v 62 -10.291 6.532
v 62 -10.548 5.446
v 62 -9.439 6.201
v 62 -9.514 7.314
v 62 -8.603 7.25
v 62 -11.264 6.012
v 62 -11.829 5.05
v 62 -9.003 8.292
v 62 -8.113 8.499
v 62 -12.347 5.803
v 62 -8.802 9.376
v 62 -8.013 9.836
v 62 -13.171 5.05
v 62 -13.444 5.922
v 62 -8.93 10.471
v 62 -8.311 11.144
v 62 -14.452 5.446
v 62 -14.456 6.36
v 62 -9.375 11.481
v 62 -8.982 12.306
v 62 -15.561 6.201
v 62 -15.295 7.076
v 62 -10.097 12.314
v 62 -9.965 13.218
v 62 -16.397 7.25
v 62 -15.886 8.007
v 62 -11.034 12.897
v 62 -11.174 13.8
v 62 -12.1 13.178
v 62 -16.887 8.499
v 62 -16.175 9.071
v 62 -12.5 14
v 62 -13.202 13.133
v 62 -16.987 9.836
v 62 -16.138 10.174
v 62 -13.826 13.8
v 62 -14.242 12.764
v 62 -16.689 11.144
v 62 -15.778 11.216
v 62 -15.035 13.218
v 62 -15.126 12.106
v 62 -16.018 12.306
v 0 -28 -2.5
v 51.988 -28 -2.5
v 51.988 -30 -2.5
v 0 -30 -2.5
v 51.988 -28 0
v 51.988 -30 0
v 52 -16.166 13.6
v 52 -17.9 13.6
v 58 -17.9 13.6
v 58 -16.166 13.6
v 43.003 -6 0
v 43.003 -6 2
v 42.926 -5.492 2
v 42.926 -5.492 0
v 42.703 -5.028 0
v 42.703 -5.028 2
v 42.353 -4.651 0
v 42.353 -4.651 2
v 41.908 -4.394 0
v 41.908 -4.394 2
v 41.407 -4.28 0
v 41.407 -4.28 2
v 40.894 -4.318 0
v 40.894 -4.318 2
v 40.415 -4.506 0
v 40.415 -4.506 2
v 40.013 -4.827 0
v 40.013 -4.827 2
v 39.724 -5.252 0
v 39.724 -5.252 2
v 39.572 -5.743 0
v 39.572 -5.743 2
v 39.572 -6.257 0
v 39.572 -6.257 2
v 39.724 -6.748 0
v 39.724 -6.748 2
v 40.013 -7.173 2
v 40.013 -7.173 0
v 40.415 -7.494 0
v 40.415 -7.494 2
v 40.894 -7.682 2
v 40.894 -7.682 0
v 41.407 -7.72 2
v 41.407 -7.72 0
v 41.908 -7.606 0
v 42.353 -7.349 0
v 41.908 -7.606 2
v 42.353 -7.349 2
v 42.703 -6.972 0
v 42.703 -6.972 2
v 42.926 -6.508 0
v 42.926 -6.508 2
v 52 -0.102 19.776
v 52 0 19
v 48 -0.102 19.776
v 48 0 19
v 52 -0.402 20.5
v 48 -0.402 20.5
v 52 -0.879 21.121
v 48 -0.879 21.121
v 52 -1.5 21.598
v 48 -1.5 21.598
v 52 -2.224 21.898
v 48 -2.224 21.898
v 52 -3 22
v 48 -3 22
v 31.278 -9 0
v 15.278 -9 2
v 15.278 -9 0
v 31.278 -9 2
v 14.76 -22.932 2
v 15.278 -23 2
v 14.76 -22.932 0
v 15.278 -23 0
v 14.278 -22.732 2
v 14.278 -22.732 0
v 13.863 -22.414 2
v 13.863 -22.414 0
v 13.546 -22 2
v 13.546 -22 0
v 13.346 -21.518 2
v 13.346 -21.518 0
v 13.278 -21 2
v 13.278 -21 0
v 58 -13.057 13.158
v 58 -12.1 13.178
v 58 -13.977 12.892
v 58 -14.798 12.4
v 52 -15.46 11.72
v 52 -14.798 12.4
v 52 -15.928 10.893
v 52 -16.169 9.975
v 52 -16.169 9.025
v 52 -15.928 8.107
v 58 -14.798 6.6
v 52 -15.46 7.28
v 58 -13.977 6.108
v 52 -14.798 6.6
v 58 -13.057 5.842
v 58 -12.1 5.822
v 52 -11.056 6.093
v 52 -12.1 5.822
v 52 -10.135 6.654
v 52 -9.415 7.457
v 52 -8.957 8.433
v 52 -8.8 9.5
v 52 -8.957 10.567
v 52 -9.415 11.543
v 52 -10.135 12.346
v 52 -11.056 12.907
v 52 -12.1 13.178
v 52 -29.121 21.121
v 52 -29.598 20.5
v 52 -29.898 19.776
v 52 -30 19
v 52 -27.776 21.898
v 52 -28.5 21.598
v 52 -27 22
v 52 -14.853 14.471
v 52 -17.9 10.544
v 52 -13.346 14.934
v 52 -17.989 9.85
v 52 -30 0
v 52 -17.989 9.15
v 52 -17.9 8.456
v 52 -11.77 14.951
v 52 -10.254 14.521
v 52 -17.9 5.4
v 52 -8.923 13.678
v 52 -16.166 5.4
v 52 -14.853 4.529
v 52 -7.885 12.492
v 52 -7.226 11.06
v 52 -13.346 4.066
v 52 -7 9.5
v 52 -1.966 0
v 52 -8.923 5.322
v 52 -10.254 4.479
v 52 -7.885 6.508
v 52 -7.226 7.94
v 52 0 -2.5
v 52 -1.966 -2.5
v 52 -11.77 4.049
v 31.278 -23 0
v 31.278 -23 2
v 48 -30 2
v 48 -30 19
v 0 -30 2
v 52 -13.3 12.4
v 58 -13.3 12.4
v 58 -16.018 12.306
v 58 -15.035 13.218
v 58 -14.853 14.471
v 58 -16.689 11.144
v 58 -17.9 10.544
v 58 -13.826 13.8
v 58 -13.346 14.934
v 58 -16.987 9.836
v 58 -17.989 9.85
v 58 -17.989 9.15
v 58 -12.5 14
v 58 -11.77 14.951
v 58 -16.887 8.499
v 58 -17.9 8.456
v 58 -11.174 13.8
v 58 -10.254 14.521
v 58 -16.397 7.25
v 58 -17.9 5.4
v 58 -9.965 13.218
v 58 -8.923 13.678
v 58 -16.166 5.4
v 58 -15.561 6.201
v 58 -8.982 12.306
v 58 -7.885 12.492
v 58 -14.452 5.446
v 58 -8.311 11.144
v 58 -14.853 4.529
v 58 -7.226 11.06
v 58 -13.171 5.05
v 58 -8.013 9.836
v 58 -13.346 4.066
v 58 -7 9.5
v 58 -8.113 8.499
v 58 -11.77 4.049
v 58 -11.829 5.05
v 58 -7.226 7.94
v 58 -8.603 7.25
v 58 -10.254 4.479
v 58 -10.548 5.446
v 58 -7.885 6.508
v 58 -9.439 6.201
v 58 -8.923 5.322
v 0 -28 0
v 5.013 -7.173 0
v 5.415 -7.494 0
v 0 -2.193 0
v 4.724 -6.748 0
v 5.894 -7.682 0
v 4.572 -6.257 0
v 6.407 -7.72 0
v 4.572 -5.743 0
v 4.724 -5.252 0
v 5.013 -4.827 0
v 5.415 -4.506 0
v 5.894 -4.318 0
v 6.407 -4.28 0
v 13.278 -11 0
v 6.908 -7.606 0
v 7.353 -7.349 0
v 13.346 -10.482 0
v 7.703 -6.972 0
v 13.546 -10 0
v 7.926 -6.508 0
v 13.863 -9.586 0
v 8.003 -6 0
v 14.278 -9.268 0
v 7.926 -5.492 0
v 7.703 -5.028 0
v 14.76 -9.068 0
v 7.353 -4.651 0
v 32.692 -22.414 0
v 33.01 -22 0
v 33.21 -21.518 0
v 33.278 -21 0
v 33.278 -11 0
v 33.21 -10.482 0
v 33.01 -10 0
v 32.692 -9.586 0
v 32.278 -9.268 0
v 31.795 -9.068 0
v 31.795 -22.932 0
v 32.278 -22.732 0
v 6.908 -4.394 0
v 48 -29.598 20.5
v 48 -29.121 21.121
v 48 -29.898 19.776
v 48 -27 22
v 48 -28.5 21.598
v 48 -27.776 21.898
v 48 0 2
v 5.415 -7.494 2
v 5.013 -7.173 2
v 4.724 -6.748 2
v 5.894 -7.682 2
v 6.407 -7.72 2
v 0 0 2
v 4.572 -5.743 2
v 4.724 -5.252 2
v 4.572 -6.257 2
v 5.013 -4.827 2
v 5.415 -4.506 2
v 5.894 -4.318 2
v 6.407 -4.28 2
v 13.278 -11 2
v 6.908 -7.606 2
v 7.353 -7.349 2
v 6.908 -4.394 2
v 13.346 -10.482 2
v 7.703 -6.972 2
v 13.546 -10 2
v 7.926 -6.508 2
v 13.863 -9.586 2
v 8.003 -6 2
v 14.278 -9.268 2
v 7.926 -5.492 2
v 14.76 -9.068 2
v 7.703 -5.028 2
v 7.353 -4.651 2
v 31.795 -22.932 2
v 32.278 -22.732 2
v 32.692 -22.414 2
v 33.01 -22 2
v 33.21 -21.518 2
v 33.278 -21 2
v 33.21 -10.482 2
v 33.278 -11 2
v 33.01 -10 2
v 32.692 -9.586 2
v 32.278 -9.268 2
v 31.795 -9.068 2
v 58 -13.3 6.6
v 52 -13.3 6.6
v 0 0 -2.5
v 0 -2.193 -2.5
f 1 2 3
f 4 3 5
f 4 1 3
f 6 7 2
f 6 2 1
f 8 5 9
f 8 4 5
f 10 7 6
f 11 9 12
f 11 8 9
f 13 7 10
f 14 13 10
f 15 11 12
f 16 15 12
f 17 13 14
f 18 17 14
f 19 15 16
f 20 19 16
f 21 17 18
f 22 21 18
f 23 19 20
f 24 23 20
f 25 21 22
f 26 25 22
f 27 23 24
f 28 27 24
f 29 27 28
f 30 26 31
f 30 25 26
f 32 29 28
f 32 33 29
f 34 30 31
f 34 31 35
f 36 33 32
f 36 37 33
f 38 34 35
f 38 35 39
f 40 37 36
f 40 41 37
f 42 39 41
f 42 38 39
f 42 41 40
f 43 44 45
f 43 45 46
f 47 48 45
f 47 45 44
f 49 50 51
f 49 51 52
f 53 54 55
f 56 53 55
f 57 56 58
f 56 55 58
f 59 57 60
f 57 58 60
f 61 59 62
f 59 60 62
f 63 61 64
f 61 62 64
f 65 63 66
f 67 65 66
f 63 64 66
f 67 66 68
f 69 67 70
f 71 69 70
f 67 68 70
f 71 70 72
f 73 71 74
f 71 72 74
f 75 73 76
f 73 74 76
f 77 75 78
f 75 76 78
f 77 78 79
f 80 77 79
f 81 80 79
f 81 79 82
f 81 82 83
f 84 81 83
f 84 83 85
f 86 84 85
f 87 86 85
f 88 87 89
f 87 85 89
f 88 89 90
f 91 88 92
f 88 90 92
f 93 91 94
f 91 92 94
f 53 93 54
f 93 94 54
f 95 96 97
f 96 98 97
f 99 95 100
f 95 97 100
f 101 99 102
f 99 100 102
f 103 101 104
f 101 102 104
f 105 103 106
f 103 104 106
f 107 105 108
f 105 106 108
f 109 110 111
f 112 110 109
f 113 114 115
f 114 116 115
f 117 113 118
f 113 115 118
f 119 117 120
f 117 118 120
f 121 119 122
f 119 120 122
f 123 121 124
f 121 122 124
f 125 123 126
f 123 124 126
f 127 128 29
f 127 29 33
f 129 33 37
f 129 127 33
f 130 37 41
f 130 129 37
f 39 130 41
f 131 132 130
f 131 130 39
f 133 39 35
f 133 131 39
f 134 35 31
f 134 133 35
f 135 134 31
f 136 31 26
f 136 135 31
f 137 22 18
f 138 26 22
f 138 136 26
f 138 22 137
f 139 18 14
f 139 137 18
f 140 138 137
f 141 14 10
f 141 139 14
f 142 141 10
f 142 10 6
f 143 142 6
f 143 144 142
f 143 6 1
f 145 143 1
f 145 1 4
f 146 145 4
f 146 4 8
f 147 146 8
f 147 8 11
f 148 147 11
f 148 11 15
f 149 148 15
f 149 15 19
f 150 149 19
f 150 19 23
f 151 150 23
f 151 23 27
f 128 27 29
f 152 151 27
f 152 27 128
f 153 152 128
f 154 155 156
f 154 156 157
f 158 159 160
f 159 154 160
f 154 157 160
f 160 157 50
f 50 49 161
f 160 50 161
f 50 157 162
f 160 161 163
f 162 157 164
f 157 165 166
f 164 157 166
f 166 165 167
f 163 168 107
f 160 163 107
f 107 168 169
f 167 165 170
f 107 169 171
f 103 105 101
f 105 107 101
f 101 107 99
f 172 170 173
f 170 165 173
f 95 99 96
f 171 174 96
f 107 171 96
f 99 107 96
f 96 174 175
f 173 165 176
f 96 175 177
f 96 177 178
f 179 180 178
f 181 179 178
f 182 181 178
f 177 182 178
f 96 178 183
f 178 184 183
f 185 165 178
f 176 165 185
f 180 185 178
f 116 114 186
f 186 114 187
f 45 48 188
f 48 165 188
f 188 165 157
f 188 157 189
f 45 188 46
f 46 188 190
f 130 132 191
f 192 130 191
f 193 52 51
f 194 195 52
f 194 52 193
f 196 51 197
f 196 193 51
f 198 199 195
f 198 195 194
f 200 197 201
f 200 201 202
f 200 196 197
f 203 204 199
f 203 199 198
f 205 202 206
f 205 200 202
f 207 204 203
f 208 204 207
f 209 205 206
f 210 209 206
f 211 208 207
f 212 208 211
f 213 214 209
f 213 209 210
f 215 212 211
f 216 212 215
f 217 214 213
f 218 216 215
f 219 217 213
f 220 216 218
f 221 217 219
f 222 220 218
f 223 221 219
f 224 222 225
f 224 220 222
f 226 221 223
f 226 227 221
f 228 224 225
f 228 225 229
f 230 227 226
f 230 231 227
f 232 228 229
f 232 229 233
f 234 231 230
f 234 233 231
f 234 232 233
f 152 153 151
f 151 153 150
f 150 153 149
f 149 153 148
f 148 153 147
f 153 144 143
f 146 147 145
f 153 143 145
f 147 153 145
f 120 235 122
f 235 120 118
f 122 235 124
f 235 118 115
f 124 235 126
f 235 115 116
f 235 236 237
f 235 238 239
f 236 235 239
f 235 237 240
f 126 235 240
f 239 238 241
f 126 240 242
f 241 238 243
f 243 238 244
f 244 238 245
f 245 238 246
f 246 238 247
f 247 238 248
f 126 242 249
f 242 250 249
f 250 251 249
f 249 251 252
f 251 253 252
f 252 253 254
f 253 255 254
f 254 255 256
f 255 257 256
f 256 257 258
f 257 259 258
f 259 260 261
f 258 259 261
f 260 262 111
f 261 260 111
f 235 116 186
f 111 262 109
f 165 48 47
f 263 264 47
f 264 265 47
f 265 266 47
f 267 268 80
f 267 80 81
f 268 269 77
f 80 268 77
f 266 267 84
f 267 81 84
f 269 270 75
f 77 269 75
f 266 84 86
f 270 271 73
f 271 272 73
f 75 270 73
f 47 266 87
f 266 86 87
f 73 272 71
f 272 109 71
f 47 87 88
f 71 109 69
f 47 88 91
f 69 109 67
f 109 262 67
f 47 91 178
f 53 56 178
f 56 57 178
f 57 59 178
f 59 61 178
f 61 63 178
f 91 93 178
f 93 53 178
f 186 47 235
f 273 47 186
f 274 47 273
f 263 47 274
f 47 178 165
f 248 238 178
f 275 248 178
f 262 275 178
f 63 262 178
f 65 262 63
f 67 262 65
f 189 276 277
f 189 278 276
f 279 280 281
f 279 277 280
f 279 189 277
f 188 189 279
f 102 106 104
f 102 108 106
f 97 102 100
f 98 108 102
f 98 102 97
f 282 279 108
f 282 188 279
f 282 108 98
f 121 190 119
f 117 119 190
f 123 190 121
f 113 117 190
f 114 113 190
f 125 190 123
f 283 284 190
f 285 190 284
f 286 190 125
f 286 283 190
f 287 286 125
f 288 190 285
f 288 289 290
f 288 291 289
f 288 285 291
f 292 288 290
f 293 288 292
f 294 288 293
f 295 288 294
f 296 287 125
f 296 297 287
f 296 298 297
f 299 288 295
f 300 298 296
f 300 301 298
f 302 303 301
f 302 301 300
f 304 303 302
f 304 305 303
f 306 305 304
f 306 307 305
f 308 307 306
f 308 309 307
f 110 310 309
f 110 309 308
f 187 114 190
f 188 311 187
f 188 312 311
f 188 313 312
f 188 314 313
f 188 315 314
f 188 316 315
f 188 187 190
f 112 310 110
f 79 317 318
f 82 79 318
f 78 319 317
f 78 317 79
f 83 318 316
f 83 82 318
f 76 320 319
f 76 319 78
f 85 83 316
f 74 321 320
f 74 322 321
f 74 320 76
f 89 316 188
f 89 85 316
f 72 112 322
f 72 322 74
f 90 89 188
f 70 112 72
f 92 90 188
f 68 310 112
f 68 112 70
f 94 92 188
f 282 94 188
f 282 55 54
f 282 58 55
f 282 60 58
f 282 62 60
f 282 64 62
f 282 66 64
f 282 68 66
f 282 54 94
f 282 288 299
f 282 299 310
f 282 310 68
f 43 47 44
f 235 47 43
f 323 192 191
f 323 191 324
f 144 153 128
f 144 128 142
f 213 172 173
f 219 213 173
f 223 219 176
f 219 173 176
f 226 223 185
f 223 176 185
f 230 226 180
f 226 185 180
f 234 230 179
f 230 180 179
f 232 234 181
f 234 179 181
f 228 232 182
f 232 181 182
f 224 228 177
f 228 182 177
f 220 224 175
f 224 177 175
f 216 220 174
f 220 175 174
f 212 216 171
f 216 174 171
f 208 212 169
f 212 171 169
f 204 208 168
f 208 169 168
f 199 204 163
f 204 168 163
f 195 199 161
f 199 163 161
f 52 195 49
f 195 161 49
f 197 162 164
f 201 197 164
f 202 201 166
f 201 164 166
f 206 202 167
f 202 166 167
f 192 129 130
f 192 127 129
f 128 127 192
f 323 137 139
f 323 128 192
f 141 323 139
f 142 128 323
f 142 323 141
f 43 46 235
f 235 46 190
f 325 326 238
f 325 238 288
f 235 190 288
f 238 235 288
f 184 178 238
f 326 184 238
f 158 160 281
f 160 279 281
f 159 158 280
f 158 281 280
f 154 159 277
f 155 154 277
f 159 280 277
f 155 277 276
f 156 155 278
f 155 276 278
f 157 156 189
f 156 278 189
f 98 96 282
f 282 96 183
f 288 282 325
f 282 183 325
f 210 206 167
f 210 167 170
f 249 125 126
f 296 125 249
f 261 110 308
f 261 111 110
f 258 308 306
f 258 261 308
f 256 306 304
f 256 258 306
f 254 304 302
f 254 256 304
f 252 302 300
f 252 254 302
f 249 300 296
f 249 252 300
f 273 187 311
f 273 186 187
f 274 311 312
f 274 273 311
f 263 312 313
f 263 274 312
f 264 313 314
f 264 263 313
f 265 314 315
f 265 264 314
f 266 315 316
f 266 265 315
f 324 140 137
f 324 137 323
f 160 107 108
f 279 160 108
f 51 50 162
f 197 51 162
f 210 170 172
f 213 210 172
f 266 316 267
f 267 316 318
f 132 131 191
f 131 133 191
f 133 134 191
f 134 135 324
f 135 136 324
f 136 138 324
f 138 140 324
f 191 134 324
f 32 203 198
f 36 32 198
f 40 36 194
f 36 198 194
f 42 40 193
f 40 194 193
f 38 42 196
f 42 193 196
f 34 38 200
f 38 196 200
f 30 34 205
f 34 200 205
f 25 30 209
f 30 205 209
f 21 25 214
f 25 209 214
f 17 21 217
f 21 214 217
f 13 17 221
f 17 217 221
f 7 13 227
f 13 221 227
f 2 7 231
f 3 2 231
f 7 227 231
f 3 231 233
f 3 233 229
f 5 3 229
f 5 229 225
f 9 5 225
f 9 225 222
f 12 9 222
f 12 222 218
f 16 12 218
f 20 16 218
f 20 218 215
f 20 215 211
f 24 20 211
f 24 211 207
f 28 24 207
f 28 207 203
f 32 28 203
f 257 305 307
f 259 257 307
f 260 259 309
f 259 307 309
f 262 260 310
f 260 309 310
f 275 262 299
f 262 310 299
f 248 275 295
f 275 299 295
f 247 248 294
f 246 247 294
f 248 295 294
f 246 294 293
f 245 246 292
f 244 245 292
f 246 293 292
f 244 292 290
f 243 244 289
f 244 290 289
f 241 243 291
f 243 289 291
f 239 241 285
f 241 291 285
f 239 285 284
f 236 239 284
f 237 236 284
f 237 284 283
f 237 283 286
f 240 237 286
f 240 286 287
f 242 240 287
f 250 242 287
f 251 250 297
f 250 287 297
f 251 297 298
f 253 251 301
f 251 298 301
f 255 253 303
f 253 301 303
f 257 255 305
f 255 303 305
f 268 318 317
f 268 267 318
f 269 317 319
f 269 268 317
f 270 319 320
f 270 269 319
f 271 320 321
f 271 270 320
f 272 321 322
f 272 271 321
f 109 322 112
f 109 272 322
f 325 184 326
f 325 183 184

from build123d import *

# Parameters (mm, degrees)
SKETCH1_W           = 52
SKETCH1_H           = 30
BOSS_EXTRUDE1_DEPTH = 2
SKETCH2_W           = 4
SKETCH2_H           = 30
BOSS_EXTRUDE2_DEPTH = 20
FILLET1_R           = 3
SKETCH4_R           = 1.725
CUT_EXTRUDE2_DEPTH  = 2
SKETCH5_W           = 51.988371154
SKETCH5_H           = 2
BOSS_EXTRUDE3_DEPTH = 2.5
SKETCH6_W           = 20
SKETCH6_H           = 14
CUT_EXTRUDE3_DEPTH  = 2
SKETCH7_W           = 8.2
SKETCH7_H           = 5.8
SKETCH7_W_2         = 5.8
SKETCH7_H_2         = 3.4
BOSS_EXTRUDE4_DEPTH = 6
SKETCH8_R           = 5.5
SKETCH8_R_2         = 4.25
BOSS_EXTRUDE5_DEPTH = 6
SKETCH10_R          = 4.5
SKETCH10_R_2        = 3.7
BOSS_EXTRUDE6_DEPTH = 10
FILLET2_R           = 2


with BuildPart() as part:
    # Sketch1 → Boss-Extrude1 (new body)
    with BuildSketch(Plane.XY):
        with Locations((26, -15)):
            Rectangle(SKETCH1_W, SKETCH1_H)
    extrude(amount=BOSS_EXTRUDE1_DEPTH)

    # Sketch2 → Boss-Extrude2 (add)
    with BuildSketch(Plane(origin=(0, 0, 2), x_dir=(-1, 0, 0), z_dir=(0, 0, -1))):
        with Locations((-50, -15)):
            Rectangle(SKETCH2_W, SKETCH2_H)
    extrude(amount=-BOSS_EXTRUDE2_DEPTH)

    # Fillet1
    fillet1_edges = [part.edges().sort_by_distance(p)[0] for p in [
        (50, -30, 22),
        (50, 0, 22),
    ]]
    fillet(fillet1_edges, radius=FILLET1_R)

    # Sketch4 → Cut-Extrude2 (cut)
    with BuildSketch(Plane.XY.offset(2)):
        with Locations((41.277695867, -6)):
            Circle(SKETCH4_R)
        with Locations((6.277695867, -6)):
            Circle(SKETCH4_R)
    extrude(amount=-CUT_EXTRUDE2_DEPTH, mode=Mode.SUBTRACT)

    # Sketch5 → Boss-Extrude3 (add)
    with BuildSketch(Plane(origin=(0, 0, 0), x_dir=(-1, 0, 0), z_dir=(0, 0, -1))):
        with Locations((-25.994185577, -29)):
            Rectangle(SKETCH5_W, SKETCH5_H)
        Polygon((-52, -1.965960074), (0, -2.193486325), (0, 0), (-52, 0), align=None)
    extrude(amount=BOSS_EXTRUDE3_DEPTH)

    # Sketch6 → Cut-Extrude3 (cut)
    with BuildSketch(Plane.XY.offset(2)):
        with Locations((23.277695867, -16)):
            Rectangle(SKETCH6_W, SKETCH6_H)
    extrude(amount=-CUT_EXTRUDE3_DEPTH, mode=Mode.SUBTRACT)

    # Sketch7 → Boss-Extrude4 (add)
    with BuildSketch(Plane(origin=(52, 0, 0), x_dir=(0, 0, -1), z_dir=(1, 0, 0))):
        with Locations((-9.5, -15)):
            Rectangle(SKETCH7_W, SKETCH7_H)
        with Locations((-9.5, -15)):
            Rectangle(SKETCH7_W_2, SKETCH7_H_2, mode=Mode.SUBTRACT)
    extrude(amount=BOSS_EXTRUDE4_DEPTH)

    # Sketch8 → Boss-Extrude5 (add)
    with BuildSketch(Plane(origin=(52, 0, 0), x_dir=(0, 0, -1), z_dir=(1, 0, 0))):
        with Locations((-9.5, -12.5)):
            Circle(SKETCH8_R)
        with Locations((-9.5, -12.5)):
            Circle(SKETCH8_R_2, mode=Mode.SUBTRACT)
    extrude(amount=BOSS_EXTRUDE5_DEPTH)

    # Sketch10 → Boss-Extrude6 (add)
    with BuildSketch(Plane(origin=(52, 0, 0), x_dir=(0, 0, -1), z_dir=(1, 0, 0))):
        with Locations(Location((-9.5, -12.5, 0), (0, 0, 180))):
            Circle(SKETCH10_R)
        with Locations(Location((-9.5, -12.5, 0), (0, 0, 173.793732249))):
            Circle(SKETCH10_R_2, mode=Mode.SUBTRACT)
    extrude(amount=BOSS_EXTRUDE6_DEPTH)

    # Fillet2
    fillet2_edges = [part.edges().sort_by_distance(p)[0] for p in [
        (33.277695867, -9, 1),
        (33.277695867, -23, 1),
        (13.277695867, -23, 1),
        (13.277695867, -9, 1),
    ]]
    fillet(fillet2_edges, radius=FILLET2_R)


solid = part.part
